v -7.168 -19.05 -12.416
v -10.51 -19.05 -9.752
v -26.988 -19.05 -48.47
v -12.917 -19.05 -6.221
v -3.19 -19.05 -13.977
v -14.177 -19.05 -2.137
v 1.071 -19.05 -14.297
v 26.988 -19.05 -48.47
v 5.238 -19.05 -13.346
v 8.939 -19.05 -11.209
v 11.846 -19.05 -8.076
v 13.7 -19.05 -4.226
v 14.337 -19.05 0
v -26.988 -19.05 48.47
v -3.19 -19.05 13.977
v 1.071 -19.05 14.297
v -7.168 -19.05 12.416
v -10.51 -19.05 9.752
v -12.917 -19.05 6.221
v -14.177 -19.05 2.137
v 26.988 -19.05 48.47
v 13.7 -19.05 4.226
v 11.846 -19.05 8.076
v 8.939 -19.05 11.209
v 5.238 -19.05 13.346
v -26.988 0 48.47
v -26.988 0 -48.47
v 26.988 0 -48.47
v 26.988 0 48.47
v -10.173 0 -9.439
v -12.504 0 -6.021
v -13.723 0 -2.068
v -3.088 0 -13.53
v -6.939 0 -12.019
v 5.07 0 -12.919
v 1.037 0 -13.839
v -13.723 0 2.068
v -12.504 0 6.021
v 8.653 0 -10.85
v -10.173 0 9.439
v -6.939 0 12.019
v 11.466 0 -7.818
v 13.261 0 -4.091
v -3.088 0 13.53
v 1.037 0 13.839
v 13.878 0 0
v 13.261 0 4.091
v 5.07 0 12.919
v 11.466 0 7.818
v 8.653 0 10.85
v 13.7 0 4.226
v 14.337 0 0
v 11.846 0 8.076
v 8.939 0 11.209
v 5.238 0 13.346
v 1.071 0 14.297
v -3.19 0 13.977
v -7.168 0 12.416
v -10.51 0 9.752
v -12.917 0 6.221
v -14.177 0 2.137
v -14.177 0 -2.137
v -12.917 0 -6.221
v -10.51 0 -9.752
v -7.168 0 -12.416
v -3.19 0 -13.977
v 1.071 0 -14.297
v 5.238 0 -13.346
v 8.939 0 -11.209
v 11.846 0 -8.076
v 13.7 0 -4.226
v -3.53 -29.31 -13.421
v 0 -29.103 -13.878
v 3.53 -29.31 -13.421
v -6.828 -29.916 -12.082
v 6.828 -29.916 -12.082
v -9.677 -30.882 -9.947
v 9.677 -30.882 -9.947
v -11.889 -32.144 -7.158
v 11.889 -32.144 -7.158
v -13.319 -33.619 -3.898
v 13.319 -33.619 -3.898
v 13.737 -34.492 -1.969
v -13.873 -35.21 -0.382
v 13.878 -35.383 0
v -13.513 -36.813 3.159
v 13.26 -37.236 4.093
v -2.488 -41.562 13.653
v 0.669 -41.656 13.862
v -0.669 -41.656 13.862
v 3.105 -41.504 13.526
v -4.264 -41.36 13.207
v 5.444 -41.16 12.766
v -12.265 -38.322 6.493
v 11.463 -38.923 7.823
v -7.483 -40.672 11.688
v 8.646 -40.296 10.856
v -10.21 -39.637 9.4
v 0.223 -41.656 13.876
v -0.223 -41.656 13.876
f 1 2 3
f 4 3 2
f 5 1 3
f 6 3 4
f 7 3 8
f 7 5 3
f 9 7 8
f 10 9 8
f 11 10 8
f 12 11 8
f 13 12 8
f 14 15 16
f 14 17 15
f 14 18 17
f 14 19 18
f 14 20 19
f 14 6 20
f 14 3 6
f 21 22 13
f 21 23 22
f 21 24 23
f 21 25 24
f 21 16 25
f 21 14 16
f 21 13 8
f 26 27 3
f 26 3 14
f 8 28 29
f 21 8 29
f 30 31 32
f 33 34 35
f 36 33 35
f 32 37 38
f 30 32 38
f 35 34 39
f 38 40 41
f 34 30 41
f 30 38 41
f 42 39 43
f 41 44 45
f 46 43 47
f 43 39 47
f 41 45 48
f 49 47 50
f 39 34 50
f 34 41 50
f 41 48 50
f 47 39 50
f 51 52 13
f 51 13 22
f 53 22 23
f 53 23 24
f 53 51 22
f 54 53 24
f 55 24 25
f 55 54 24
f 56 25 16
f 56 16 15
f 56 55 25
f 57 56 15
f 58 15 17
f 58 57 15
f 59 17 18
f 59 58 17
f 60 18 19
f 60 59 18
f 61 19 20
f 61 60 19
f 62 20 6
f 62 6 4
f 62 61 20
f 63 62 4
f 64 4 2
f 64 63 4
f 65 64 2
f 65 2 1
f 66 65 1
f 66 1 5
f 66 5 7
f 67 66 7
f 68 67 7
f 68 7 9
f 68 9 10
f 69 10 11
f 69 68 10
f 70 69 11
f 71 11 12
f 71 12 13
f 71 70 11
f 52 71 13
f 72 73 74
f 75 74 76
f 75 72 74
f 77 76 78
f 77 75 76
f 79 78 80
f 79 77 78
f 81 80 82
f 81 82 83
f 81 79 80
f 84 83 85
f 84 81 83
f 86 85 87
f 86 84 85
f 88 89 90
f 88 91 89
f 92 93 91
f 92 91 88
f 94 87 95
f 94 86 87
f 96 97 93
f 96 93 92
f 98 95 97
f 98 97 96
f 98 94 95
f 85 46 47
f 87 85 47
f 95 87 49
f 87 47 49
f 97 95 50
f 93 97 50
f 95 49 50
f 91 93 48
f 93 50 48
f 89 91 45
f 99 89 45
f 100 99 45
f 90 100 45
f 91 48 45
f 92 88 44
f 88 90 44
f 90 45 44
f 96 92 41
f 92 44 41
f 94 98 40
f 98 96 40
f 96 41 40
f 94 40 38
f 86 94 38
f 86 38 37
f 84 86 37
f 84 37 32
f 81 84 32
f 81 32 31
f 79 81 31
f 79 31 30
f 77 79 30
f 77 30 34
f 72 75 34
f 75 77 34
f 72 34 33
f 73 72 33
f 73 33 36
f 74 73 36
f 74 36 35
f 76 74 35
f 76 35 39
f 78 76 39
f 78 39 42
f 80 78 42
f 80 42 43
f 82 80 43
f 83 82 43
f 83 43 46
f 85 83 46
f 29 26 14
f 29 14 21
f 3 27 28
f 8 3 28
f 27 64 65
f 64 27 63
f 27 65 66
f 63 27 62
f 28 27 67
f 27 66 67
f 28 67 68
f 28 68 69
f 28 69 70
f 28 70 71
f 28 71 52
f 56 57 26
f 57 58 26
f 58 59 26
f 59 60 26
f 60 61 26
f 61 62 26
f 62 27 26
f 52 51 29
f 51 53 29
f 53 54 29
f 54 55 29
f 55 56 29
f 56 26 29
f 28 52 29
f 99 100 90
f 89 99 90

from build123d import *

# Parameters (mm, degrees)
F0_W          = 53.9750009775
F0_H          = 96.9409272075
F0_R          = 14.3368039947
F1_DEPTH      = 19.05
F2_R          = 13.8779125856
F3_DEPTH      = 41.656
F5_DEPTH      = 25.4
F5_DEPTH_BACK = 25.4


with BuildPart() as f1:
    # F0 (on Front) → F1 (new body)
    with BuildSketch(Plane.XZ):
        Rectangle(F0_W, F0_H)
        Circle(F0_R, mode=Mode.SUBTRACT)
    extrude(amount=F1_DEPTH)


with BuildPart() as f3:
    # F2 (on Front) → F3 (new body)
    with BuildSketch(Plane.XZ):
        Circle(F2_R)
    extrude(amount=F3_DEPTH)

    # F4 (on Right) → F5 (cut, two sides)
    with BuildSketch(Plane.YZ) as f5_sk:
        Polygon((-27.5864936411, -17.2301027924), (-42.4337126315, 15.5804129317), (-42.0671105385, -17.2301027924), align=None)
    extrude(amount=-F5_DEPTH, mode=Mode.SUBTRACT)
    extrude(f5_sk.sketch, amount=F5_DEPTH_BACK, mode=Mode.SUBTRACT)


solid = Compound([f1.part, f3.part])
